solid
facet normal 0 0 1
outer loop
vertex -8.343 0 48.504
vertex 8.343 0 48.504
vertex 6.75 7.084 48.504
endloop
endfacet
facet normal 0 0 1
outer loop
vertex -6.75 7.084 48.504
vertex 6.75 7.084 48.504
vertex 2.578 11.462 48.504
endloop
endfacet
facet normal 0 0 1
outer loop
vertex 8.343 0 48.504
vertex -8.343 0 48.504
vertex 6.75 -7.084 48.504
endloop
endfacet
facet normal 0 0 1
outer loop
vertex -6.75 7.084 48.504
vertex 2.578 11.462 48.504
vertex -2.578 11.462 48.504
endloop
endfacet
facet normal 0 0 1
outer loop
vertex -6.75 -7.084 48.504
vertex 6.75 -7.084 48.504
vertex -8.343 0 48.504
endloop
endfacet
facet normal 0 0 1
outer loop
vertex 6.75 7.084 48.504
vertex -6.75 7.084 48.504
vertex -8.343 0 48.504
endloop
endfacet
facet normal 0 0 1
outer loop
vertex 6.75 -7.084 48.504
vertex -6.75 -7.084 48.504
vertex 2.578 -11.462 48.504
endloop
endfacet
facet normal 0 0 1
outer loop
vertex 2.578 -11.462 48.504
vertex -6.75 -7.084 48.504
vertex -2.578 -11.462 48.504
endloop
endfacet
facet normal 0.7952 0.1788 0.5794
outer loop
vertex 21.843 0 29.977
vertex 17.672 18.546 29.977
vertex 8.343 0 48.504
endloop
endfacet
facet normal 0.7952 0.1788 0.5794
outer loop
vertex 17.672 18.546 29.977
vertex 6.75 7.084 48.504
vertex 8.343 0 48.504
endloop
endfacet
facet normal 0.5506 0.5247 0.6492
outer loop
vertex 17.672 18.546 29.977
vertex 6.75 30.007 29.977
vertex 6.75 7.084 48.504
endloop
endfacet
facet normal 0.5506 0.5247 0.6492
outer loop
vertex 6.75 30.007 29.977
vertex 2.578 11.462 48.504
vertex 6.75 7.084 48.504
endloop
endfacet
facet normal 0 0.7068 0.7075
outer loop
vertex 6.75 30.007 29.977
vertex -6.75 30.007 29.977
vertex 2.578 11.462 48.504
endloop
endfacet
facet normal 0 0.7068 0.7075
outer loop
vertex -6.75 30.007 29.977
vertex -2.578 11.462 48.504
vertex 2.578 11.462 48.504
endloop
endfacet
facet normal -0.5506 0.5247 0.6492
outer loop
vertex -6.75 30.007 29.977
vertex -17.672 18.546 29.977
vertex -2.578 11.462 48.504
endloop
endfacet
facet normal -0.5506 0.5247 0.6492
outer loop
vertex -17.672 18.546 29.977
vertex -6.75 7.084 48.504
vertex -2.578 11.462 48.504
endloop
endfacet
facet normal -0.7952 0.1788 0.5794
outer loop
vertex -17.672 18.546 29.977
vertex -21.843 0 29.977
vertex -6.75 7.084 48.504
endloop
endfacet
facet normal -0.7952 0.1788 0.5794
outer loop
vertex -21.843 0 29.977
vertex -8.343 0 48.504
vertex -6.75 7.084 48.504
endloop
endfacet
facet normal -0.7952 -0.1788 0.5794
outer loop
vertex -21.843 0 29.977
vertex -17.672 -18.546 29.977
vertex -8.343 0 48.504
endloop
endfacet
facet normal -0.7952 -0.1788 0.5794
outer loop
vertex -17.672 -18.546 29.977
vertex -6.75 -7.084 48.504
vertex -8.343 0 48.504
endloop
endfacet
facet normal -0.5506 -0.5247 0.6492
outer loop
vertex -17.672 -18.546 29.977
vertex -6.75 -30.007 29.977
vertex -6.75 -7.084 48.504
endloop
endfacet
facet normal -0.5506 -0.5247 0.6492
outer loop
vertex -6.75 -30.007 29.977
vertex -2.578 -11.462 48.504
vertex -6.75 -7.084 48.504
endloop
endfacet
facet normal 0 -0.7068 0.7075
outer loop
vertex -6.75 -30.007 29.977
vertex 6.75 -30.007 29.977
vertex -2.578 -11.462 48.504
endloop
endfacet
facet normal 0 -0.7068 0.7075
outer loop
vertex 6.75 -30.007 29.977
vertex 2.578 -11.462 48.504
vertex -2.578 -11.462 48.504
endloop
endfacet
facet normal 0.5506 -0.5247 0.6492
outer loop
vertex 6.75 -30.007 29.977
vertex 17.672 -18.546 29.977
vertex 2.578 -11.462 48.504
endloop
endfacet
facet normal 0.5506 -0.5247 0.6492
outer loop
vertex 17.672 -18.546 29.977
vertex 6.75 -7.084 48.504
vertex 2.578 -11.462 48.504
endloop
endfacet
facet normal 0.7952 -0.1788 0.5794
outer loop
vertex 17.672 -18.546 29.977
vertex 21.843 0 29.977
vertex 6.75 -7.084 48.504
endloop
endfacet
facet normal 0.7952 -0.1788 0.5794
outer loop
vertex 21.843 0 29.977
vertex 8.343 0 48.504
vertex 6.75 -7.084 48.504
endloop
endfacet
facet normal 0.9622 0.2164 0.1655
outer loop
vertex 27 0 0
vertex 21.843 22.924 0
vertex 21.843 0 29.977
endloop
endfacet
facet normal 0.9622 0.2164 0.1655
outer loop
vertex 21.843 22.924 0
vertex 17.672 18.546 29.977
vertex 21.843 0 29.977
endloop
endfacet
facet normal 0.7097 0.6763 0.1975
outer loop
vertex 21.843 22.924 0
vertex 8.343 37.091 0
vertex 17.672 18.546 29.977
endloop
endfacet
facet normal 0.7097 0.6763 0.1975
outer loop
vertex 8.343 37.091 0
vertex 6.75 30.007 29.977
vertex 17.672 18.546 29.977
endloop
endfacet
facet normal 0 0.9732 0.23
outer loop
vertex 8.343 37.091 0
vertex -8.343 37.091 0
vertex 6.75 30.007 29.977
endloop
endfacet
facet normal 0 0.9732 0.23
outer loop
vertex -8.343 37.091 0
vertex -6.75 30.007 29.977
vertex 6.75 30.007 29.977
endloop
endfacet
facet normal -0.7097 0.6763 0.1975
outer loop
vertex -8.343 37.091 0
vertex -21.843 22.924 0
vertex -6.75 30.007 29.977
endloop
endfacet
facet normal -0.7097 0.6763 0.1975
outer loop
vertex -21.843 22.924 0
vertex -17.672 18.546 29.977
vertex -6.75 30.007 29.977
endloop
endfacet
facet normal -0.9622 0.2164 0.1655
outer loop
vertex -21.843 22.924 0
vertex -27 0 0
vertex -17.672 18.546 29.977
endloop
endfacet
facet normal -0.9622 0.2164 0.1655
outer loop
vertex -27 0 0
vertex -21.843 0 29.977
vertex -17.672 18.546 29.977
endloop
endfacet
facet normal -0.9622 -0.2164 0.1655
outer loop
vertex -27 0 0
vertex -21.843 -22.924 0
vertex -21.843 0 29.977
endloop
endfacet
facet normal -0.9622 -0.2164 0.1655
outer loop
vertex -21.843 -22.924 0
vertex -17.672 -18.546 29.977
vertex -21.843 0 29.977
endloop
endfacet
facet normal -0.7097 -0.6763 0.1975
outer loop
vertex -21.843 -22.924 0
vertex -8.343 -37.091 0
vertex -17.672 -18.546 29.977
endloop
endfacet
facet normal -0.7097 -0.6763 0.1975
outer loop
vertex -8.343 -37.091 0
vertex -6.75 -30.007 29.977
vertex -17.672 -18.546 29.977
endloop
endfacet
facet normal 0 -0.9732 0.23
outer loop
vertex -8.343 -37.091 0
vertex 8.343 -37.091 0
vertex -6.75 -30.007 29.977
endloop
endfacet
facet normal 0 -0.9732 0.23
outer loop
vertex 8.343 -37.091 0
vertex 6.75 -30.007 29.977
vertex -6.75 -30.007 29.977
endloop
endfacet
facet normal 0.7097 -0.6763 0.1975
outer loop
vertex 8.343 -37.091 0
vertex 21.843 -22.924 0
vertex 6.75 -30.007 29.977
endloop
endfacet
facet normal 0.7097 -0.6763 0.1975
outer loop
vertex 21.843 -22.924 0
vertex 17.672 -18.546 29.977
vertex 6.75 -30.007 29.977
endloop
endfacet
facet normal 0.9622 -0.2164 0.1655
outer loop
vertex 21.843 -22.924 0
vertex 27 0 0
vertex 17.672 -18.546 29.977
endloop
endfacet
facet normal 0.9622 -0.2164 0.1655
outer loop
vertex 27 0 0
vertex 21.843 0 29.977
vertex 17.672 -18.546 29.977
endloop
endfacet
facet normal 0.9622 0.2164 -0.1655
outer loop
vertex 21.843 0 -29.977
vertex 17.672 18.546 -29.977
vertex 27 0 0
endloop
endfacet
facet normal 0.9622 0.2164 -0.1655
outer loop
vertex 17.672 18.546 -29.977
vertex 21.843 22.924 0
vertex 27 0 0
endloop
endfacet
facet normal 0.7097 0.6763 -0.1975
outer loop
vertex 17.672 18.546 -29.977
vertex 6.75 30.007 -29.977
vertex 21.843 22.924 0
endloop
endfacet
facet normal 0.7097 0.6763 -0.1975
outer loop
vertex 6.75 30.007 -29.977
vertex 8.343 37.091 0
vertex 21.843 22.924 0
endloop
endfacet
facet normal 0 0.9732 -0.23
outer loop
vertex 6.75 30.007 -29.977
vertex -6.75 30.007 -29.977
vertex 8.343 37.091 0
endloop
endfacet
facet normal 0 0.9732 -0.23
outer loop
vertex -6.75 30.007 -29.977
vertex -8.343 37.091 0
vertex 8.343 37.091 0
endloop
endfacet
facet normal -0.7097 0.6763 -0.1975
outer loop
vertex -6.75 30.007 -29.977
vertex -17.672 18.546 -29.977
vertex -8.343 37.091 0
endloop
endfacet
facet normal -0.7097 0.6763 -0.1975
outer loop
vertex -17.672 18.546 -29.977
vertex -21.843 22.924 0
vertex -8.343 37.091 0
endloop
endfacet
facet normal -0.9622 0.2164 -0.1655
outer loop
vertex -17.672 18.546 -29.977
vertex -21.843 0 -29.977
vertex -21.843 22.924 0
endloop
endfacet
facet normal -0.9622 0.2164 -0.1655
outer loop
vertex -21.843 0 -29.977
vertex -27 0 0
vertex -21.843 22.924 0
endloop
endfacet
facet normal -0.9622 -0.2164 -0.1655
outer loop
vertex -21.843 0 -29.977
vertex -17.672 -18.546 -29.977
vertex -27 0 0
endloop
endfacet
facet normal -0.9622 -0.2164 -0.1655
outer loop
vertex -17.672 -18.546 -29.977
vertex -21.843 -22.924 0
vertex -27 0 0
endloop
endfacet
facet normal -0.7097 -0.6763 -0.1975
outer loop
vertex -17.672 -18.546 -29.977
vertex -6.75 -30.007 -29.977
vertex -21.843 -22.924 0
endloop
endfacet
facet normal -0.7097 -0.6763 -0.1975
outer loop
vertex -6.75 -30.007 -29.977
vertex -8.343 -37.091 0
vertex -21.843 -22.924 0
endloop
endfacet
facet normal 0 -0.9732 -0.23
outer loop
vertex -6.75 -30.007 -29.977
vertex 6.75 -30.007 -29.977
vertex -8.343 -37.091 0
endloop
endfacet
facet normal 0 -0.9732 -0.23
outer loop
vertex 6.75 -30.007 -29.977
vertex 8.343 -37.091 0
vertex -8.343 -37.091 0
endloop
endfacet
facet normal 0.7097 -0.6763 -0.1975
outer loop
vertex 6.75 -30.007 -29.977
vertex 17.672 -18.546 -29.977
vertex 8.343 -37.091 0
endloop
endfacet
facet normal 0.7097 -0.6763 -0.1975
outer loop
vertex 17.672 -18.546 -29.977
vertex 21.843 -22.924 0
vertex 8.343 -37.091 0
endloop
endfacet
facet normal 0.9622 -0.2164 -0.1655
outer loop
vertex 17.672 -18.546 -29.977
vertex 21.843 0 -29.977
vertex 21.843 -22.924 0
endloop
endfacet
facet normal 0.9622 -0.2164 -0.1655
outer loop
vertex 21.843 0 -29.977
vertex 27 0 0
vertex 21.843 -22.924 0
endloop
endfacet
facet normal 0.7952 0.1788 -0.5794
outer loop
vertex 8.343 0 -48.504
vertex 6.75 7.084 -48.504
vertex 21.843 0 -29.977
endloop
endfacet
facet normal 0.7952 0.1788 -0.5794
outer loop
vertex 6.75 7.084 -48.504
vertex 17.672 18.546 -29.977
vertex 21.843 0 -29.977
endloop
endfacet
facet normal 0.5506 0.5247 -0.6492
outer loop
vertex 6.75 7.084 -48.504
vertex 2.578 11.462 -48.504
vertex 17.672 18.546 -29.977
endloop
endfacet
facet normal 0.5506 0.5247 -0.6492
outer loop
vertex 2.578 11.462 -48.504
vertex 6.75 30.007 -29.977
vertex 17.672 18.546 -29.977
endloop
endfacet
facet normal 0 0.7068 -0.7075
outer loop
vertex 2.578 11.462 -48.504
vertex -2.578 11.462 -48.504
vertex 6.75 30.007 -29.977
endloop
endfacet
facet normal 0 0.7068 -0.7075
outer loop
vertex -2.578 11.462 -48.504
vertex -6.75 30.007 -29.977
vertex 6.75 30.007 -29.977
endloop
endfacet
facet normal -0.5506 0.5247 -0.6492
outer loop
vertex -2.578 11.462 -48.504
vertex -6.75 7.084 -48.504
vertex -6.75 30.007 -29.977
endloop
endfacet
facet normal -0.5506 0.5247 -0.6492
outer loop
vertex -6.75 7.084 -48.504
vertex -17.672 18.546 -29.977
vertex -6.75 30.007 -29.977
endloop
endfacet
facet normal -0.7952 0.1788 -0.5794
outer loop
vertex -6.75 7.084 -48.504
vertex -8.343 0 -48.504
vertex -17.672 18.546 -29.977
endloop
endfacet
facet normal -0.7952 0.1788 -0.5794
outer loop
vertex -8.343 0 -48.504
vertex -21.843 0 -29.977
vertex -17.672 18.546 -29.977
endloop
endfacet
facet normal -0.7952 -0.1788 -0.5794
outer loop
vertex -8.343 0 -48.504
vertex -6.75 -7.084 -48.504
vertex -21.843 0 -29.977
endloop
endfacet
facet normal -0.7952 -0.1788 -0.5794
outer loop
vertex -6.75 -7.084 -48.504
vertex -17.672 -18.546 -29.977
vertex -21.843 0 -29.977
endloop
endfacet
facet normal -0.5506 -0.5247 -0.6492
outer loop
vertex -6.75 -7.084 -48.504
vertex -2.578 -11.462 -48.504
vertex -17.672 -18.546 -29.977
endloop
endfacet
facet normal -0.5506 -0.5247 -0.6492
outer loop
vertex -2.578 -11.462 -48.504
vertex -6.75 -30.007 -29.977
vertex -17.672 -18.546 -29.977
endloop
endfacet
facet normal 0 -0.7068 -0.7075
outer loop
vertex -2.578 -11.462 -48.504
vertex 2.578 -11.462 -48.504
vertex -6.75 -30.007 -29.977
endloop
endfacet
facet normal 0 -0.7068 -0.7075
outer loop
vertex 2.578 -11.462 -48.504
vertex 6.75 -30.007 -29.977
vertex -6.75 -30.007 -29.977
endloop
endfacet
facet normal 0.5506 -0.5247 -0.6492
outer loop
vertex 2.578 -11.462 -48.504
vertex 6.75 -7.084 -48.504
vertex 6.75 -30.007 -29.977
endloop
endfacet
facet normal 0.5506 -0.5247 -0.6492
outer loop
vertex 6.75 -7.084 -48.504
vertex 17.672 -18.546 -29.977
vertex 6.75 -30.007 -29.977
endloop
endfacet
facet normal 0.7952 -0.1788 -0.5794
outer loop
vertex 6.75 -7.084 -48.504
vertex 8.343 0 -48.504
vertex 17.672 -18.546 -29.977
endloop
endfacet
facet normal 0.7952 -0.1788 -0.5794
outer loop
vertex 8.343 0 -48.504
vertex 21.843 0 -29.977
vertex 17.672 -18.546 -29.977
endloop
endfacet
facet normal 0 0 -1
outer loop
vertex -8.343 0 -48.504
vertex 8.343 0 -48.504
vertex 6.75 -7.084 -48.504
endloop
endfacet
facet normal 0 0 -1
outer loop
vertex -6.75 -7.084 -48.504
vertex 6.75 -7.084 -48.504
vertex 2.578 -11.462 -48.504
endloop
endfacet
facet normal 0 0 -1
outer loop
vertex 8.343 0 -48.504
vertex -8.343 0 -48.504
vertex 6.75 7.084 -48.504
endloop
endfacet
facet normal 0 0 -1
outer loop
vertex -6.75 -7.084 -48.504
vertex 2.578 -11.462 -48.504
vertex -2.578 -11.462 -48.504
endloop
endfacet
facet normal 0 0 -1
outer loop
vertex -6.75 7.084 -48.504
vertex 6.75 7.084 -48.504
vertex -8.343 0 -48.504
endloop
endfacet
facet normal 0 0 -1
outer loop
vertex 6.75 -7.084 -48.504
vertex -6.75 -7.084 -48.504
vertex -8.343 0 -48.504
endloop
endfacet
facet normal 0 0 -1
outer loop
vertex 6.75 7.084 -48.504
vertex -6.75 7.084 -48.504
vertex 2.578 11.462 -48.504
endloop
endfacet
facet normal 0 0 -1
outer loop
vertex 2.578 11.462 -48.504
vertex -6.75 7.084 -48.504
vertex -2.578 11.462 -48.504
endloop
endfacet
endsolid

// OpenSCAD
// Generated by SolidPython 1.0.1 on 2020-07-29 00:46:49


scale(v = [9, 13, 17]) {
	sphere(r = 3);
}
/***********************************************
*********      SolidPython code:      **********
************************************************
 
# import packages: SolidPython
from solid import *
from solid.utils import *
from itertools import chain, combinations, permutations


class Resize:

    def __init__(self, scad_file):
        self.scad_file = scad_file
        #self.scad_file = import_scad(scad_file)
        # cone/cylinder param:
        self.r1 = 0
        self.r2 = 0
        self.h = 0
        # rectangular prism param:
        self.w = 0
        self.l = 0
        # ellipse param:
        self.r = 0

    # import OpenScad code (file name corresponds to shape)


    # classify shape + parameters
    def assign(self, param1, param2, param3):
        if self.scad_file == 'cone.scad':
            self.r1 = param1
            self.r2 = param2
            self.h = param3
        elif self.scad_file == 'cylinder.scad':
            self.r1 = param1
            self.r2 = param2
            self.h = param3
        elif self.scad_file == 'rectangularPrism.scad':
            self.h = param1
            self.l = param2
            self.w = param3
        else:
            self.r = param1
            self.h = param2

    # resize parameters
    def iterate(self):
        x = range(3, 20, 2)
        i = 1
        if self.scad_file == 'cone.scad':
            tempList = list(permutations(x, 2))
            for temp in tempList:
                param1 = temp[0]
                param2 = temp[1]
                filepath = 'produced_scad_files/' + 'cone' + str(param1) + '_' + str(param2) + '_' + '.scad'
                scad_render_to_file(cylinder(h=param1, r1=param2, r2=0), filepath)

        elif self.scad_file == 'cylinder.scad':
            tempList = list(permutations(x, 3))
            for temp in tempList:
                param1 = temp[0]
                param2 = temp[1]
                filepath = 'produced_scad_files/' + 'cylinder' + str(param1) + '_' + str(param2) + '_' + '.scad'
                scad_render_to_file(cylinder(h=param1, r1=param2, r2=param2), filepath)

        elif self.scad_file == 'rectangularPrism.scad':
            tempList = list(permutations(x, 3))
            for temp in tempList:
                param1 = temp[0]
                param2 = temp[1]
                param3 = temp[2]
                filepath = 'produced_scad_files/' + 'rectangularPrism' + str(param1) + '_' + str(param2) + '_' + str(
                    param3) + '.scad'
                scad_render_to_file(cube(size=(param1, param2, param3)), filepath)

        elif self.scad_file == 'ellipse.scad':
            tempList = list(permutations(x, 4))
            for temp in tempList:
                param1 = temp[0]
                param2 = temp[1]
                param3 = temp[2]
                param4 = temp[3]
                filepath = 'produced_scad_files/' + 'ellipse' + str(param1) + '_' + str(param2) + '_' + str(param3) + '_' + str(param4) + '.scad'
                scad_render_to_file(scale([param1, param2, param3])(sphere(r=param4)), filepath)

    def render_to_scadfile(self):
        scad_render_to_file(scad, 'example.scad') 
 
************************************************/
